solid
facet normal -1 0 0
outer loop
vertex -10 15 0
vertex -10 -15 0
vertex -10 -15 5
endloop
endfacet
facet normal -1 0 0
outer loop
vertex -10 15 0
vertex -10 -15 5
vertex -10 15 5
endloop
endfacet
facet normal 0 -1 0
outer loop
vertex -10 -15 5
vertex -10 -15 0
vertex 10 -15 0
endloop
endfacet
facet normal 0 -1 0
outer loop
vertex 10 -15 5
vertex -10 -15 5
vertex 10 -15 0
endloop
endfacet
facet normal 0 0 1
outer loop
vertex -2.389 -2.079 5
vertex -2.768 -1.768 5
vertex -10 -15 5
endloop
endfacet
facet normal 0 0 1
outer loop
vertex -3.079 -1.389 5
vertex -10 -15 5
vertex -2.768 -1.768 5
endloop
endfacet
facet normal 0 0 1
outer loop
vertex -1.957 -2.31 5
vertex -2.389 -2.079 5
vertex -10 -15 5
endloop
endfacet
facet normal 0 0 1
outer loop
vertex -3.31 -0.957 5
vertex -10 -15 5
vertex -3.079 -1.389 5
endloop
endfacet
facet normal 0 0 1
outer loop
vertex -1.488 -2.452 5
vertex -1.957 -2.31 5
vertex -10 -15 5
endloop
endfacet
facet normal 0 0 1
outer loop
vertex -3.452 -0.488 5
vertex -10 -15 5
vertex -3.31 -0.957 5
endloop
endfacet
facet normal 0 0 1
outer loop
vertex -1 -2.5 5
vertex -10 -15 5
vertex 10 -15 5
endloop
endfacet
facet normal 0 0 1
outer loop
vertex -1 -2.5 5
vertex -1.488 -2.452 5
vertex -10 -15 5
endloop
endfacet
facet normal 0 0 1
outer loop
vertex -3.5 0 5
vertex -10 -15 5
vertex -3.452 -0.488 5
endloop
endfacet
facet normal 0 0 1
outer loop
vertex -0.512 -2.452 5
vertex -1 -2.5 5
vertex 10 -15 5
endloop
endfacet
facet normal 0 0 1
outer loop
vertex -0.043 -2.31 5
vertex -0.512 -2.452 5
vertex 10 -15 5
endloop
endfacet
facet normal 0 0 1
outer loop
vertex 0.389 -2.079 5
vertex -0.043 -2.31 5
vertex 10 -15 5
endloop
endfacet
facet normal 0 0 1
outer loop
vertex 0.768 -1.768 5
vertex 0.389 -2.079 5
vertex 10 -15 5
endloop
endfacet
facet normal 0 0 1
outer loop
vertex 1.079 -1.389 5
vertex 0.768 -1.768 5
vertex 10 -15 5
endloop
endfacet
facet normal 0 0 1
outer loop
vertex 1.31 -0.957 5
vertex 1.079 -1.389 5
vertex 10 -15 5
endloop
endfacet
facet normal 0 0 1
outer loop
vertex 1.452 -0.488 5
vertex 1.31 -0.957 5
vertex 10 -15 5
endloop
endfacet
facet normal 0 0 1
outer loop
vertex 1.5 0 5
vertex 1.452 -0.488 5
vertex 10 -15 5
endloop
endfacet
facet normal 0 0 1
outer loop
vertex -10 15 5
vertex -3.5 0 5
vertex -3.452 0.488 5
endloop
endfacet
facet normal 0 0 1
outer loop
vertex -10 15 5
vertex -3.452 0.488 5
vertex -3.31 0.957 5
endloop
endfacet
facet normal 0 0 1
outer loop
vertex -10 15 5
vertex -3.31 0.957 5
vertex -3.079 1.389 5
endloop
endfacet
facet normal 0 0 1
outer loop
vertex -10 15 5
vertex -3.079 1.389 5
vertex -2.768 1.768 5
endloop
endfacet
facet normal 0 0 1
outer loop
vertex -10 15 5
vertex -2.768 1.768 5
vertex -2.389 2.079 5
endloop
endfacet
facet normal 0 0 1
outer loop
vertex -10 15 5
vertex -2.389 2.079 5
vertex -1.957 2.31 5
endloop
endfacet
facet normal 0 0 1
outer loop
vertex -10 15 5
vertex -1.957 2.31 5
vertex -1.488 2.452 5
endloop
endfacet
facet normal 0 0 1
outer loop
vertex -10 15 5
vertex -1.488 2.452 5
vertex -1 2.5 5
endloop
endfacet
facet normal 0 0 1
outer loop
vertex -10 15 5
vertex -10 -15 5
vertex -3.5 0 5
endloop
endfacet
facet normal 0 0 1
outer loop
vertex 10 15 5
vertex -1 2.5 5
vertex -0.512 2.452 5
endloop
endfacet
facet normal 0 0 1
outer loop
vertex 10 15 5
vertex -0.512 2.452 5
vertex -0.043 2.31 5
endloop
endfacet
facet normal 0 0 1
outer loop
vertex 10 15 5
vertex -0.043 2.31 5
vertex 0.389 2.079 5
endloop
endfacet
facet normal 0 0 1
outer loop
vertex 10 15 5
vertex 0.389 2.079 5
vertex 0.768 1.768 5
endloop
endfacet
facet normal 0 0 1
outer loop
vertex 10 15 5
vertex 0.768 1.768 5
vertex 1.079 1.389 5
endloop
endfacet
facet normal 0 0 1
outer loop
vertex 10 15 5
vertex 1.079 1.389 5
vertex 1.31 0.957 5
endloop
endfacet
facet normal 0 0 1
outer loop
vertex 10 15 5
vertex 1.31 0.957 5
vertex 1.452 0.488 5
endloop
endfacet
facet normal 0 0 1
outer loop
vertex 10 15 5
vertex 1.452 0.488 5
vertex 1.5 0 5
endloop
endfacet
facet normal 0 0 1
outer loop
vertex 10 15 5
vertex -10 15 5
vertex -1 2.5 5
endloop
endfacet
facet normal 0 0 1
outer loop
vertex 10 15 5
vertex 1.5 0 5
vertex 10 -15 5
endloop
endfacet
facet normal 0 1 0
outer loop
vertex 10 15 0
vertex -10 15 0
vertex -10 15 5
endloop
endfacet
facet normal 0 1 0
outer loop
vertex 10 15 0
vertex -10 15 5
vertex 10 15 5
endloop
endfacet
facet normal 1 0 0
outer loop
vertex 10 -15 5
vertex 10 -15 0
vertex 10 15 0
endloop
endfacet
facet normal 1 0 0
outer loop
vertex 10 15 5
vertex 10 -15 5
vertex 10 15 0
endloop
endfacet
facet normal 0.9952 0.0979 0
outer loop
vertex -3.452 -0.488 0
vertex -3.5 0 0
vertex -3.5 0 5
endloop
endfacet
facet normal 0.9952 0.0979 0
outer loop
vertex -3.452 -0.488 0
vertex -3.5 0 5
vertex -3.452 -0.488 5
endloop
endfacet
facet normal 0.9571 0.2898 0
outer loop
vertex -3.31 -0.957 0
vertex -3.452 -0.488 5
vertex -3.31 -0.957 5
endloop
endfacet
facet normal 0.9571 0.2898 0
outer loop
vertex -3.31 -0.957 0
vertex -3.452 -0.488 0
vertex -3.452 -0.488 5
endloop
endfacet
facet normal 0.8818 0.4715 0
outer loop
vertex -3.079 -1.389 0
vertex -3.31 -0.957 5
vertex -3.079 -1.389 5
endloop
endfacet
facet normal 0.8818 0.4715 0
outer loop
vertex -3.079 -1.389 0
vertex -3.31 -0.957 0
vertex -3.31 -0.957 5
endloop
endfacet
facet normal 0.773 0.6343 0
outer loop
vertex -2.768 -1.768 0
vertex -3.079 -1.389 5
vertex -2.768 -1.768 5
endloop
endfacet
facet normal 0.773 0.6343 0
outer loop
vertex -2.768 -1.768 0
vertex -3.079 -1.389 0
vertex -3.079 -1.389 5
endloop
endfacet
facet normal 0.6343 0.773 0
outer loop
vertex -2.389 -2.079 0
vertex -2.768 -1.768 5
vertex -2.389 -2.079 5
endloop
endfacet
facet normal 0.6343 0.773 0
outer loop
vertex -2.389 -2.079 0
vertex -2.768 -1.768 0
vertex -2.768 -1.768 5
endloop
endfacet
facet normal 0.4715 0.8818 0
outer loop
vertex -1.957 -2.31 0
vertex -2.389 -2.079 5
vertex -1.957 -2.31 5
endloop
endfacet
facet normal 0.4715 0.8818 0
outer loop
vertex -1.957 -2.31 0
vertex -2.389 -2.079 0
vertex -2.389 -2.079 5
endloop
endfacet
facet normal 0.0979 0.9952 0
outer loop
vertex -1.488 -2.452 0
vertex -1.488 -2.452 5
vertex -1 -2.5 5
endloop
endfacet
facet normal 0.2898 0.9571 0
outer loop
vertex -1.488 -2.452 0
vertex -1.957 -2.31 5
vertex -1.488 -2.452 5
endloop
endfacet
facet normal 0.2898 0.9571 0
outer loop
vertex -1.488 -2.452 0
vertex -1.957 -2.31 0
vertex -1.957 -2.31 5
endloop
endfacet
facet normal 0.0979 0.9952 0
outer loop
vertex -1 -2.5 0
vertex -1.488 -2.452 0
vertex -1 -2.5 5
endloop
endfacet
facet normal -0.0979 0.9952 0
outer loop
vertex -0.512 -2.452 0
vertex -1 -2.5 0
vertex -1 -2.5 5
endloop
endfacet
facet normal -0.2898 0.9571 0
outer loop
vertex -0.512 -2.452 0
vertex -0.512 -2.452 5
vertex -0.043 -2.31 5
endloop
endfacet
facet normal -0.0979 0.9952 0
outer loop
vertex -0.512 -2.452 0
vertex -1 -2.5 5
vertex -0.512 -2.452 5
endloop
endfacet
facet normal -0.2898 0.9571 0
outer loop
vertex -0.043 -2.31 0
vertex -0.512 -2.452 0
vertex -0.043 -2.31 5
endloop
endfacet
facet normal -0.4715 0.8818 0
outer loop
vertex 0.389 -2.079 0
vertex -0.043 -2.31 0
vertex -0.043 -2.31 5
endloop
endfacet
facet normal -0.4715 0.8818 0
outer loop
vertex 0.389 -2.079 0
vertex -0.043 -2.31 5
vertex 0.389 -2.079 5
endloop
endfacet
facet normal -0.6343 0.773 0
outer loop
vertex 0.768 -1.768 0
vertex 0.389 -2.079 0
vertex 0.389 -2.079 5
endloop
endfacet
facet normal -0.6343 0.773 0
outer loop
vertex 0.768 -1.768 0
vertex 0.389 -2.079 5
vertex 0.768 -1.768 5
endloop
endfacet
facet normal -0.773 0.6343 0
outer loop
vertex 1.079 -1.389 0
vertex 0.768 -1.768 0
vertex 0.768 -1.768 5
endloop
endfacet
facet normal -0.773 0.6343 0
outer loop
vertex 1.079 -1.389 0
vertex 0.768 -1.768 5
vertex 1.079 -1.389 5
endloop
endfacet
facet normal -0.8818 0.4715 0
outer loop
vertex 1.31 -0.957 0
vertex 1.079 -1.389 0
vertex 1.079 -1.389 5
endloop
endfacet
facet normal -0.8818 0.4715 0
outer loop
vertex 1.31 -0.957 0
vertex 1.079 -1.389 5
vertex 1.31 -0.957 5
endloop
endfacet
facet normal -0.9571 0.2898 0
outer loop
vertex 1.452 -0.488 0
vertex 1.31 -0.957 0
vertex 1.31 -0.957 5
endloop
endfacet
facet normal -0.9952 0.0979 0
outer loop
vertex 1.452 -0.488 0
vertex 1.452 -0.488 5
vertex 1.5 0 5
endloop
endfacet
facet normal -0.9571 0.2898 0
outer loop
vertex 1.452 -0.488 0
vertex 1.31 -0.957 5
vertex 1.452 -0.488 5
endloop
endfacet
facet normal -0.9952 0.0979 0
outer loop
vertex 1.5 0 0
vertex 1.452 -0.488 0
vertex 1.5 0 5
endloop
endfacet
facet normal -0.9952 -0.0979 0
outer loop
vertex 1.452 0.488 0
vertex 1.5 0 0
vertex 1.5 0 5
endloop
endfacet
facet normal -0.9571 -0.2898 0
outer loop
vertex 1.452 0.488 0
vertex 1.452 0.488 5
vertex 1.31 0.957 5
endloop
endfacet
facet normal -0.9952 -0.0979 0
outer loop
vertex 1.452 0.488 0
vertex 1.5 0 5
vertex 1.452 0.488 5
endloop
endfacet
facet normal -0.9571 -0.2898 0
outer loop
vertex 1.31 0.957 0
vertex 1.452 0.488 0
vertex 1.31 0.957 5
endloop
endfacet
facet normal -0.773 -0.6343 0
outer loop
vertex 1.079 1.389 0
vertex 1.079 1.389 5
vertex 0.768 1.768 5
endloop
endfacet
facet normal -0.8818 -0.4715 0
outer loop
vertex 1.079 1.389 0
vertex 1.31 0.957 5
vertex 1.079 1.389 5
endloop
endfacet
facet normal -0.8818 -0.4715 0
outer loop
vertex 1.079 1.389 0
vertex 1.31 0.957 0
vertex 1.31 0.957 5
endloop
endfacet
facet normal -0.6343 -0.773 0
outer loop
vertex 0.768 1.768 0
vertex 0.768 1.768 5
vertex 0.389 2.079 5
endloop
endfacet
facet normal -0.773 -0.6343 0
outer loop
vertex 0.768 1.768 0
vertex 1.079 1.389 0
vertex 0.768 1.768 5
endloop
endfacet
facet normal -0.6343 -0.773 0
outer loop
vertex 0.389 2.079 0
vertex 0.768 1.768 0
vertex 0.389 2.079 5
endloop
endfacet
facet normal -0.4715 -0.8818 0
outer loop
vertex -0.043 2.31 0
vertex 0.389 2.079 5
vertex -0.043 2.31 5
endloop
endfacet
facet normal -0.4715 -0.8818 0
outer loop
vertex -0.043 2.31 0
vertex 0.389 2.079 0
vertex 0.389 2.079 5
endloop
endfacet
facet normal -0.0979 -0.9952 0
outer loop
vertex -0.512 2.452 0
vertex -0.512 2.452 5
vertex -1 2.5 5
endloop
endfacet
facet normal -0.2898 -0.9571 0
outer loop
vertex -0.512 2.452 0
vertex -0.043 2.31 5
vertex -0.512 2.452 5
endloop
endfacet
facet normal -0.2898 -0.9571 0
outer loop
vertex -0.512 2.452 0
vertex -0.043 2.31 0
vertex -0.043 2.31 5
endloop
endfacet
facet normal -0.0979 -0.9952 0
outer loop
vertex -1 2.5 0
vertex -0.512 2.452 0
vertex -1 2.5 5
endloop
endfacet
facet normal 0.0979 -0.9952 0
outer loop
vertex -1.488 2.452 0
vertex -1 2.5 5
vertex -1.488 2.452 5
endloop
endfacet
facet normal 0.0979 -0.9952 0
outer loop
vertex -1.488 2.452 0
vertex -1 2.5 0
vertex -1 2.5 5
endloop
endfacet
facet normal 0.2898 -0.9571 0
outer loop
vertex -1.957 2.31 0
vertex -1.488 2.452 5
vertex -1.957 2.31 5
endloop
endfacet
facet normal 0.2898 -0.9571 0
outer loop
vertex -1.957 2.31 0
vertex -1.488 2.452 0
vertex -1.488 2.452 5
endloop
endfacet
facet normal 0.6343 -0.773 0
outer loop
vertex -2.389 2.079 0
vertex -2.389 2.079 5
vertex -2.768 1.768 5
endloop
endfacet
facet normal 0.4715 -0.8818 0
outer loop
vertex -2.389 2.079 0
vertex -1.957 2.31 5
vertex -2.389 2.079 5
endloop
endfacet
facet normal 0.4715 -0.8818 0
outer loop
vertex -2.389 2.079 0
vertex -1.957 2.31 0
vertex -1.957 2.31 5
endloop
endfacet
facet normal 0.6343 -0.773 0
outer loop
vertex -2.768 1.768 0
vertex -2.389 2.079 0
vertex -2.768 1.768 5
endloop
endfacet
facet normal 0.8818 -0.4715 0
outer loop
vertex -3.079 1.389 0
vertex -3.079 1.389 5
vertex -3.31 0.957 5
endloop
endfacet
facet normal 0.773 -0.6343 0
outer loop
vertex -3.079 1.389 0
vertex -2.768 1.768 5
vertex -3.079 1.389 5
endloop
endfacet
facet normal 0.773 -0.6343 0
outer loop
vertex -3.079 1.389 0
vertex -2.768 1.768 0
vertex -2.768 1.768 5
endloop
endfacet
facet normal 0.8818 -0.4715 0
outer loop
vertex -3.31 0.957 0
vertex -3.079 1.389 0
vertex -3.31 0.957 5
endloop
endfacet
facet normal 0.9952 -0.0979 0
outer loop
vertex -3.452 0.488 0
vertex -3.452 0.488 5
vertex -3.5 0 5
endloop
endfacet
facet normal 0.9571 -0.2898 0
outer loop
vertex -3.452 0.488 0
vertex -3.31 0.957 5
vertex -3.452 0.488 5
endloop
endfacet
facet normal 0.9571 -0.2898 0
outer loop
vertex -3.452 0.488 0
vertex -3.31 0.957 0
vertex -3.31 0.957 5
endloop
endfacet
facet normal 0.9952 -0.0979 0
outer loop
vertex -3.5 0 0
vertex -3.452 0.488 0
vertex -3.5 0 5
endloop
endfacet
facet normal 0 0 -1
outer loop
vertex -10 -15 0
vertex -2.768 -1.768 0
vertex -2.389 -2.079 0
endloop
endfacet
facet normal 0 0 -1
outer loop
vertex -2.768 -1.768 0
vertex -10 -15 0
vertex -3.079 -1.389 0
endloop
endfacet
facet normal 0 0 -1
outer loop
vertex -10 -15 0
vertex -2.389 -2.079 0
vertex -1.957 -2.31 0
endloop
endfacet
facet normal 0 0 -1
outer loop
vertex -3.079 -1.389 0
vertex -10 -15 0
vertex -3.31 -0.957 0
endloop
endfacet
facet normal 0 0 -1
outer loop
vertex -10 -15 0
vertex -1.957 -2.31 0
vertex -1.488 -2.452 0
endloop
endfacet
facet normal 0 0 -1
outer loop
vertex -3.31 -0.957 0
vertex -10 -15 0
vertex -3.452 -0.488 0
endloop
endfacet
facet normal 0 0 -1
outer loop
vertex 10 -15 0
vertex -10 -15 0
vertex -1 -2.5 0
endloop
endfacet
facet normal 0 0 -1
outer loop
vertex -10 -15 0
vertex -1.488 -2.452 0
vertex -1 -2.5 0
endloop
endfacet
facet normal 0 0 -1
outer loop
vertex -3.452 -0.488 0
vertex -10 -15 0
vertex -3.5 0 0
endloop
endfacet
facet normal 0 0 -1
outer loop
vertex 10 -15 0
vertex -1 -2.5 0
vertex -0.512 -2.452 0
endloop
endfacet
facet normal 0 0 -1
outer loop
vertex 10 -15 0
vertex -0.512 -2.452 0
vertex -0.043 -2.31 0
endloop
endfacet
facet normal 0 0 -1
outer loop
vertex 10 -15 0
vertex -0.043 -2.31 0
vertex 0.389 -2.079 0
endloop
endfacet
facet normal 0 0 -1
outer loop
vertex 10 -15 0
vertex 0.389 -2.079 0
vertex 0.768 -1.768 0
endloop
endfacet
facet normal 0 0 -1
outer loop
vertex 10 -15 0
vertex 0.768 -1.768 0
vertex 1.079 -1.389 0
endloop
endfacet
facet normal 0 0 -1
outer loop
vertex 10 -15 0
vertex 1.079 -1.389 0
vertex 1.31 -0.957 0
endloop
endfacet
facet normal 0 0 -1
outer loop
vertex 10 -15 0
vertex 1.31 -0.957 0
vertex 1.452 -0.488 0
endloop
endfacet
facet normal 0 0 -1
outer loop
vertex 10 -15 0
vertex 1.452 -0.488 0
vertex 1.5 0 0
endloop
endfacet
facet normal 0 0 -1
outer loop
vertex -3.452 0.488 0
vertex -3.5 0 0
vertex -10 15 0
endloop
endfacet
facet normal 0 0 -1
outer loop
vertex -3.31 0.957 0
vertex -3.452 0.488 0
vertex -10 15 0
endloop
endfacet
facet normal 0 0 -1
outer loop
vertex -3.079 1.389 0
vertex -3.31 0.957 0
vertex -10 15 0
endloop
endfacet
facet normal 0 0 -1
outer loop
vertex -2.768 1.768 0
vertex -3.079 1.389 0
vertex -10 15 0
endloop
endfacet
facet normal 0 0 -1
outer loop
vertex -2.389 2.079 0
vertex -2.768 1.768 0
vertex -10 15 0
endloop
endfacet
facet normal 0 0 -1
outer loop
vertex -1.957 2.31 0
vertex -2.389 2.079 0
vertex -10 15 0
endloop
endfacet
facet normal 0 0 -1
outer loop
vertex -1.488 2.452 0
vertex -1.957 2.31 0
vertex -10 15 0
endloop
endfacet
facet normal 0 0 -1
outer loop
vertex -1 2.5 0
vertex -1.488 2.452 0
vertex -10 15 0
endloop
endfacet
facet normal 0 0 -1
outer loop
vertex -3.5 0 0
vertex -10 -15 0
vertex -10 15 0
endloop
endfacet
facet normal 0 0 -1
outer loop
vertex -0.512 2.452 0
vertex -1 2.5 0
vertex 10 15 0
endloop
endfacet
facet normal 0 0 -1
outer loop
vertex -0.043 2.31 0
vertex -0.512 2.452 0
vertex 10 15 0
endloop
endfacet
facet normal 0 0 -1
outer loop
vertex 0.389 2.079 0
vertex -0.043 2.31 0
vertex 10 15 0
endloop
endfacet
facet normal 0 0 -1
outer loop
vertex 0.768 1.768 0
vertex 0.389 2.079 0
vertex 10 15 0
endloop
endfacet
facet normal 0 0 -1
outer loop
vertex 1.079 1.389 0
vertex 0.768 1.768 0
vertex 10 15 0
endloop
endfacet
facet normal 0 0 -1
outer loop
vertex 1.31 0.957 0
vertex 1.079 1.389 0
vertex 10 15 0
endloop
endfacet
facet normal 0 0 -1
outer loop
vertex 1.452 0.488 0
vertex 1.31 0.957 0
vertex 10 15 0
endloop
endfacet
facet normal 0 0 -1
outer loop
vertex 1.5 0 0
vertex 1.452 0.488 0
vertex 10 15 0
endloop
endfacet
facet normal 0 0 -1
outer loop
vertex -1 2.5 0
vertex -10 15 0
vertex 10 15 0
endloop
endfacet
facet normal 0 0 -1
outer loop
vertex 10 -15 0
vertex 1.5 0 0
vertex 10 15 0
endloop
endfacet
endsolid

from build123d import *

# Parameters (mm, degrees)
SKETCH1_W               = 20
SKETCH1_H               = 30
BOSS_EXTRUDE1_DEPTH     = 5
CUT_EXTRUDE1_DEPTH      = 12
CUT_EXTRUDE1_DEPTH_BACK = 9
SKETCH2_R               = 2.5


with BuildPart() as part:
    # Sketch1 → Boss-Extrude1 (new body)
    with BuildSketch(Plane.XY):
        Rectangle(SKETCH1_W, SKETCH1_H)
    extrude(amount=BOSS_EXTRUDE1_DEPTH)

    # Sketch2 → Cut-Extrude1 (cut, two sides: drawn at the far end of the back side and taken through both)
    with BuildSketch(Plane.XY.offset(5).offset(-CUT_EXTRUDE1_DEPTH_BACK)):
        with Locations(Location((-1, 0, 0), (0, 0, 180))):
            Circle(SKETCH2_R)
    extrude(amount=CUT_EXTRUDE1_DEPTH + CUT_EXTRUDE1_DEPTH_BACK, mode=Mode.SUBTRACT)


solid = part.part
